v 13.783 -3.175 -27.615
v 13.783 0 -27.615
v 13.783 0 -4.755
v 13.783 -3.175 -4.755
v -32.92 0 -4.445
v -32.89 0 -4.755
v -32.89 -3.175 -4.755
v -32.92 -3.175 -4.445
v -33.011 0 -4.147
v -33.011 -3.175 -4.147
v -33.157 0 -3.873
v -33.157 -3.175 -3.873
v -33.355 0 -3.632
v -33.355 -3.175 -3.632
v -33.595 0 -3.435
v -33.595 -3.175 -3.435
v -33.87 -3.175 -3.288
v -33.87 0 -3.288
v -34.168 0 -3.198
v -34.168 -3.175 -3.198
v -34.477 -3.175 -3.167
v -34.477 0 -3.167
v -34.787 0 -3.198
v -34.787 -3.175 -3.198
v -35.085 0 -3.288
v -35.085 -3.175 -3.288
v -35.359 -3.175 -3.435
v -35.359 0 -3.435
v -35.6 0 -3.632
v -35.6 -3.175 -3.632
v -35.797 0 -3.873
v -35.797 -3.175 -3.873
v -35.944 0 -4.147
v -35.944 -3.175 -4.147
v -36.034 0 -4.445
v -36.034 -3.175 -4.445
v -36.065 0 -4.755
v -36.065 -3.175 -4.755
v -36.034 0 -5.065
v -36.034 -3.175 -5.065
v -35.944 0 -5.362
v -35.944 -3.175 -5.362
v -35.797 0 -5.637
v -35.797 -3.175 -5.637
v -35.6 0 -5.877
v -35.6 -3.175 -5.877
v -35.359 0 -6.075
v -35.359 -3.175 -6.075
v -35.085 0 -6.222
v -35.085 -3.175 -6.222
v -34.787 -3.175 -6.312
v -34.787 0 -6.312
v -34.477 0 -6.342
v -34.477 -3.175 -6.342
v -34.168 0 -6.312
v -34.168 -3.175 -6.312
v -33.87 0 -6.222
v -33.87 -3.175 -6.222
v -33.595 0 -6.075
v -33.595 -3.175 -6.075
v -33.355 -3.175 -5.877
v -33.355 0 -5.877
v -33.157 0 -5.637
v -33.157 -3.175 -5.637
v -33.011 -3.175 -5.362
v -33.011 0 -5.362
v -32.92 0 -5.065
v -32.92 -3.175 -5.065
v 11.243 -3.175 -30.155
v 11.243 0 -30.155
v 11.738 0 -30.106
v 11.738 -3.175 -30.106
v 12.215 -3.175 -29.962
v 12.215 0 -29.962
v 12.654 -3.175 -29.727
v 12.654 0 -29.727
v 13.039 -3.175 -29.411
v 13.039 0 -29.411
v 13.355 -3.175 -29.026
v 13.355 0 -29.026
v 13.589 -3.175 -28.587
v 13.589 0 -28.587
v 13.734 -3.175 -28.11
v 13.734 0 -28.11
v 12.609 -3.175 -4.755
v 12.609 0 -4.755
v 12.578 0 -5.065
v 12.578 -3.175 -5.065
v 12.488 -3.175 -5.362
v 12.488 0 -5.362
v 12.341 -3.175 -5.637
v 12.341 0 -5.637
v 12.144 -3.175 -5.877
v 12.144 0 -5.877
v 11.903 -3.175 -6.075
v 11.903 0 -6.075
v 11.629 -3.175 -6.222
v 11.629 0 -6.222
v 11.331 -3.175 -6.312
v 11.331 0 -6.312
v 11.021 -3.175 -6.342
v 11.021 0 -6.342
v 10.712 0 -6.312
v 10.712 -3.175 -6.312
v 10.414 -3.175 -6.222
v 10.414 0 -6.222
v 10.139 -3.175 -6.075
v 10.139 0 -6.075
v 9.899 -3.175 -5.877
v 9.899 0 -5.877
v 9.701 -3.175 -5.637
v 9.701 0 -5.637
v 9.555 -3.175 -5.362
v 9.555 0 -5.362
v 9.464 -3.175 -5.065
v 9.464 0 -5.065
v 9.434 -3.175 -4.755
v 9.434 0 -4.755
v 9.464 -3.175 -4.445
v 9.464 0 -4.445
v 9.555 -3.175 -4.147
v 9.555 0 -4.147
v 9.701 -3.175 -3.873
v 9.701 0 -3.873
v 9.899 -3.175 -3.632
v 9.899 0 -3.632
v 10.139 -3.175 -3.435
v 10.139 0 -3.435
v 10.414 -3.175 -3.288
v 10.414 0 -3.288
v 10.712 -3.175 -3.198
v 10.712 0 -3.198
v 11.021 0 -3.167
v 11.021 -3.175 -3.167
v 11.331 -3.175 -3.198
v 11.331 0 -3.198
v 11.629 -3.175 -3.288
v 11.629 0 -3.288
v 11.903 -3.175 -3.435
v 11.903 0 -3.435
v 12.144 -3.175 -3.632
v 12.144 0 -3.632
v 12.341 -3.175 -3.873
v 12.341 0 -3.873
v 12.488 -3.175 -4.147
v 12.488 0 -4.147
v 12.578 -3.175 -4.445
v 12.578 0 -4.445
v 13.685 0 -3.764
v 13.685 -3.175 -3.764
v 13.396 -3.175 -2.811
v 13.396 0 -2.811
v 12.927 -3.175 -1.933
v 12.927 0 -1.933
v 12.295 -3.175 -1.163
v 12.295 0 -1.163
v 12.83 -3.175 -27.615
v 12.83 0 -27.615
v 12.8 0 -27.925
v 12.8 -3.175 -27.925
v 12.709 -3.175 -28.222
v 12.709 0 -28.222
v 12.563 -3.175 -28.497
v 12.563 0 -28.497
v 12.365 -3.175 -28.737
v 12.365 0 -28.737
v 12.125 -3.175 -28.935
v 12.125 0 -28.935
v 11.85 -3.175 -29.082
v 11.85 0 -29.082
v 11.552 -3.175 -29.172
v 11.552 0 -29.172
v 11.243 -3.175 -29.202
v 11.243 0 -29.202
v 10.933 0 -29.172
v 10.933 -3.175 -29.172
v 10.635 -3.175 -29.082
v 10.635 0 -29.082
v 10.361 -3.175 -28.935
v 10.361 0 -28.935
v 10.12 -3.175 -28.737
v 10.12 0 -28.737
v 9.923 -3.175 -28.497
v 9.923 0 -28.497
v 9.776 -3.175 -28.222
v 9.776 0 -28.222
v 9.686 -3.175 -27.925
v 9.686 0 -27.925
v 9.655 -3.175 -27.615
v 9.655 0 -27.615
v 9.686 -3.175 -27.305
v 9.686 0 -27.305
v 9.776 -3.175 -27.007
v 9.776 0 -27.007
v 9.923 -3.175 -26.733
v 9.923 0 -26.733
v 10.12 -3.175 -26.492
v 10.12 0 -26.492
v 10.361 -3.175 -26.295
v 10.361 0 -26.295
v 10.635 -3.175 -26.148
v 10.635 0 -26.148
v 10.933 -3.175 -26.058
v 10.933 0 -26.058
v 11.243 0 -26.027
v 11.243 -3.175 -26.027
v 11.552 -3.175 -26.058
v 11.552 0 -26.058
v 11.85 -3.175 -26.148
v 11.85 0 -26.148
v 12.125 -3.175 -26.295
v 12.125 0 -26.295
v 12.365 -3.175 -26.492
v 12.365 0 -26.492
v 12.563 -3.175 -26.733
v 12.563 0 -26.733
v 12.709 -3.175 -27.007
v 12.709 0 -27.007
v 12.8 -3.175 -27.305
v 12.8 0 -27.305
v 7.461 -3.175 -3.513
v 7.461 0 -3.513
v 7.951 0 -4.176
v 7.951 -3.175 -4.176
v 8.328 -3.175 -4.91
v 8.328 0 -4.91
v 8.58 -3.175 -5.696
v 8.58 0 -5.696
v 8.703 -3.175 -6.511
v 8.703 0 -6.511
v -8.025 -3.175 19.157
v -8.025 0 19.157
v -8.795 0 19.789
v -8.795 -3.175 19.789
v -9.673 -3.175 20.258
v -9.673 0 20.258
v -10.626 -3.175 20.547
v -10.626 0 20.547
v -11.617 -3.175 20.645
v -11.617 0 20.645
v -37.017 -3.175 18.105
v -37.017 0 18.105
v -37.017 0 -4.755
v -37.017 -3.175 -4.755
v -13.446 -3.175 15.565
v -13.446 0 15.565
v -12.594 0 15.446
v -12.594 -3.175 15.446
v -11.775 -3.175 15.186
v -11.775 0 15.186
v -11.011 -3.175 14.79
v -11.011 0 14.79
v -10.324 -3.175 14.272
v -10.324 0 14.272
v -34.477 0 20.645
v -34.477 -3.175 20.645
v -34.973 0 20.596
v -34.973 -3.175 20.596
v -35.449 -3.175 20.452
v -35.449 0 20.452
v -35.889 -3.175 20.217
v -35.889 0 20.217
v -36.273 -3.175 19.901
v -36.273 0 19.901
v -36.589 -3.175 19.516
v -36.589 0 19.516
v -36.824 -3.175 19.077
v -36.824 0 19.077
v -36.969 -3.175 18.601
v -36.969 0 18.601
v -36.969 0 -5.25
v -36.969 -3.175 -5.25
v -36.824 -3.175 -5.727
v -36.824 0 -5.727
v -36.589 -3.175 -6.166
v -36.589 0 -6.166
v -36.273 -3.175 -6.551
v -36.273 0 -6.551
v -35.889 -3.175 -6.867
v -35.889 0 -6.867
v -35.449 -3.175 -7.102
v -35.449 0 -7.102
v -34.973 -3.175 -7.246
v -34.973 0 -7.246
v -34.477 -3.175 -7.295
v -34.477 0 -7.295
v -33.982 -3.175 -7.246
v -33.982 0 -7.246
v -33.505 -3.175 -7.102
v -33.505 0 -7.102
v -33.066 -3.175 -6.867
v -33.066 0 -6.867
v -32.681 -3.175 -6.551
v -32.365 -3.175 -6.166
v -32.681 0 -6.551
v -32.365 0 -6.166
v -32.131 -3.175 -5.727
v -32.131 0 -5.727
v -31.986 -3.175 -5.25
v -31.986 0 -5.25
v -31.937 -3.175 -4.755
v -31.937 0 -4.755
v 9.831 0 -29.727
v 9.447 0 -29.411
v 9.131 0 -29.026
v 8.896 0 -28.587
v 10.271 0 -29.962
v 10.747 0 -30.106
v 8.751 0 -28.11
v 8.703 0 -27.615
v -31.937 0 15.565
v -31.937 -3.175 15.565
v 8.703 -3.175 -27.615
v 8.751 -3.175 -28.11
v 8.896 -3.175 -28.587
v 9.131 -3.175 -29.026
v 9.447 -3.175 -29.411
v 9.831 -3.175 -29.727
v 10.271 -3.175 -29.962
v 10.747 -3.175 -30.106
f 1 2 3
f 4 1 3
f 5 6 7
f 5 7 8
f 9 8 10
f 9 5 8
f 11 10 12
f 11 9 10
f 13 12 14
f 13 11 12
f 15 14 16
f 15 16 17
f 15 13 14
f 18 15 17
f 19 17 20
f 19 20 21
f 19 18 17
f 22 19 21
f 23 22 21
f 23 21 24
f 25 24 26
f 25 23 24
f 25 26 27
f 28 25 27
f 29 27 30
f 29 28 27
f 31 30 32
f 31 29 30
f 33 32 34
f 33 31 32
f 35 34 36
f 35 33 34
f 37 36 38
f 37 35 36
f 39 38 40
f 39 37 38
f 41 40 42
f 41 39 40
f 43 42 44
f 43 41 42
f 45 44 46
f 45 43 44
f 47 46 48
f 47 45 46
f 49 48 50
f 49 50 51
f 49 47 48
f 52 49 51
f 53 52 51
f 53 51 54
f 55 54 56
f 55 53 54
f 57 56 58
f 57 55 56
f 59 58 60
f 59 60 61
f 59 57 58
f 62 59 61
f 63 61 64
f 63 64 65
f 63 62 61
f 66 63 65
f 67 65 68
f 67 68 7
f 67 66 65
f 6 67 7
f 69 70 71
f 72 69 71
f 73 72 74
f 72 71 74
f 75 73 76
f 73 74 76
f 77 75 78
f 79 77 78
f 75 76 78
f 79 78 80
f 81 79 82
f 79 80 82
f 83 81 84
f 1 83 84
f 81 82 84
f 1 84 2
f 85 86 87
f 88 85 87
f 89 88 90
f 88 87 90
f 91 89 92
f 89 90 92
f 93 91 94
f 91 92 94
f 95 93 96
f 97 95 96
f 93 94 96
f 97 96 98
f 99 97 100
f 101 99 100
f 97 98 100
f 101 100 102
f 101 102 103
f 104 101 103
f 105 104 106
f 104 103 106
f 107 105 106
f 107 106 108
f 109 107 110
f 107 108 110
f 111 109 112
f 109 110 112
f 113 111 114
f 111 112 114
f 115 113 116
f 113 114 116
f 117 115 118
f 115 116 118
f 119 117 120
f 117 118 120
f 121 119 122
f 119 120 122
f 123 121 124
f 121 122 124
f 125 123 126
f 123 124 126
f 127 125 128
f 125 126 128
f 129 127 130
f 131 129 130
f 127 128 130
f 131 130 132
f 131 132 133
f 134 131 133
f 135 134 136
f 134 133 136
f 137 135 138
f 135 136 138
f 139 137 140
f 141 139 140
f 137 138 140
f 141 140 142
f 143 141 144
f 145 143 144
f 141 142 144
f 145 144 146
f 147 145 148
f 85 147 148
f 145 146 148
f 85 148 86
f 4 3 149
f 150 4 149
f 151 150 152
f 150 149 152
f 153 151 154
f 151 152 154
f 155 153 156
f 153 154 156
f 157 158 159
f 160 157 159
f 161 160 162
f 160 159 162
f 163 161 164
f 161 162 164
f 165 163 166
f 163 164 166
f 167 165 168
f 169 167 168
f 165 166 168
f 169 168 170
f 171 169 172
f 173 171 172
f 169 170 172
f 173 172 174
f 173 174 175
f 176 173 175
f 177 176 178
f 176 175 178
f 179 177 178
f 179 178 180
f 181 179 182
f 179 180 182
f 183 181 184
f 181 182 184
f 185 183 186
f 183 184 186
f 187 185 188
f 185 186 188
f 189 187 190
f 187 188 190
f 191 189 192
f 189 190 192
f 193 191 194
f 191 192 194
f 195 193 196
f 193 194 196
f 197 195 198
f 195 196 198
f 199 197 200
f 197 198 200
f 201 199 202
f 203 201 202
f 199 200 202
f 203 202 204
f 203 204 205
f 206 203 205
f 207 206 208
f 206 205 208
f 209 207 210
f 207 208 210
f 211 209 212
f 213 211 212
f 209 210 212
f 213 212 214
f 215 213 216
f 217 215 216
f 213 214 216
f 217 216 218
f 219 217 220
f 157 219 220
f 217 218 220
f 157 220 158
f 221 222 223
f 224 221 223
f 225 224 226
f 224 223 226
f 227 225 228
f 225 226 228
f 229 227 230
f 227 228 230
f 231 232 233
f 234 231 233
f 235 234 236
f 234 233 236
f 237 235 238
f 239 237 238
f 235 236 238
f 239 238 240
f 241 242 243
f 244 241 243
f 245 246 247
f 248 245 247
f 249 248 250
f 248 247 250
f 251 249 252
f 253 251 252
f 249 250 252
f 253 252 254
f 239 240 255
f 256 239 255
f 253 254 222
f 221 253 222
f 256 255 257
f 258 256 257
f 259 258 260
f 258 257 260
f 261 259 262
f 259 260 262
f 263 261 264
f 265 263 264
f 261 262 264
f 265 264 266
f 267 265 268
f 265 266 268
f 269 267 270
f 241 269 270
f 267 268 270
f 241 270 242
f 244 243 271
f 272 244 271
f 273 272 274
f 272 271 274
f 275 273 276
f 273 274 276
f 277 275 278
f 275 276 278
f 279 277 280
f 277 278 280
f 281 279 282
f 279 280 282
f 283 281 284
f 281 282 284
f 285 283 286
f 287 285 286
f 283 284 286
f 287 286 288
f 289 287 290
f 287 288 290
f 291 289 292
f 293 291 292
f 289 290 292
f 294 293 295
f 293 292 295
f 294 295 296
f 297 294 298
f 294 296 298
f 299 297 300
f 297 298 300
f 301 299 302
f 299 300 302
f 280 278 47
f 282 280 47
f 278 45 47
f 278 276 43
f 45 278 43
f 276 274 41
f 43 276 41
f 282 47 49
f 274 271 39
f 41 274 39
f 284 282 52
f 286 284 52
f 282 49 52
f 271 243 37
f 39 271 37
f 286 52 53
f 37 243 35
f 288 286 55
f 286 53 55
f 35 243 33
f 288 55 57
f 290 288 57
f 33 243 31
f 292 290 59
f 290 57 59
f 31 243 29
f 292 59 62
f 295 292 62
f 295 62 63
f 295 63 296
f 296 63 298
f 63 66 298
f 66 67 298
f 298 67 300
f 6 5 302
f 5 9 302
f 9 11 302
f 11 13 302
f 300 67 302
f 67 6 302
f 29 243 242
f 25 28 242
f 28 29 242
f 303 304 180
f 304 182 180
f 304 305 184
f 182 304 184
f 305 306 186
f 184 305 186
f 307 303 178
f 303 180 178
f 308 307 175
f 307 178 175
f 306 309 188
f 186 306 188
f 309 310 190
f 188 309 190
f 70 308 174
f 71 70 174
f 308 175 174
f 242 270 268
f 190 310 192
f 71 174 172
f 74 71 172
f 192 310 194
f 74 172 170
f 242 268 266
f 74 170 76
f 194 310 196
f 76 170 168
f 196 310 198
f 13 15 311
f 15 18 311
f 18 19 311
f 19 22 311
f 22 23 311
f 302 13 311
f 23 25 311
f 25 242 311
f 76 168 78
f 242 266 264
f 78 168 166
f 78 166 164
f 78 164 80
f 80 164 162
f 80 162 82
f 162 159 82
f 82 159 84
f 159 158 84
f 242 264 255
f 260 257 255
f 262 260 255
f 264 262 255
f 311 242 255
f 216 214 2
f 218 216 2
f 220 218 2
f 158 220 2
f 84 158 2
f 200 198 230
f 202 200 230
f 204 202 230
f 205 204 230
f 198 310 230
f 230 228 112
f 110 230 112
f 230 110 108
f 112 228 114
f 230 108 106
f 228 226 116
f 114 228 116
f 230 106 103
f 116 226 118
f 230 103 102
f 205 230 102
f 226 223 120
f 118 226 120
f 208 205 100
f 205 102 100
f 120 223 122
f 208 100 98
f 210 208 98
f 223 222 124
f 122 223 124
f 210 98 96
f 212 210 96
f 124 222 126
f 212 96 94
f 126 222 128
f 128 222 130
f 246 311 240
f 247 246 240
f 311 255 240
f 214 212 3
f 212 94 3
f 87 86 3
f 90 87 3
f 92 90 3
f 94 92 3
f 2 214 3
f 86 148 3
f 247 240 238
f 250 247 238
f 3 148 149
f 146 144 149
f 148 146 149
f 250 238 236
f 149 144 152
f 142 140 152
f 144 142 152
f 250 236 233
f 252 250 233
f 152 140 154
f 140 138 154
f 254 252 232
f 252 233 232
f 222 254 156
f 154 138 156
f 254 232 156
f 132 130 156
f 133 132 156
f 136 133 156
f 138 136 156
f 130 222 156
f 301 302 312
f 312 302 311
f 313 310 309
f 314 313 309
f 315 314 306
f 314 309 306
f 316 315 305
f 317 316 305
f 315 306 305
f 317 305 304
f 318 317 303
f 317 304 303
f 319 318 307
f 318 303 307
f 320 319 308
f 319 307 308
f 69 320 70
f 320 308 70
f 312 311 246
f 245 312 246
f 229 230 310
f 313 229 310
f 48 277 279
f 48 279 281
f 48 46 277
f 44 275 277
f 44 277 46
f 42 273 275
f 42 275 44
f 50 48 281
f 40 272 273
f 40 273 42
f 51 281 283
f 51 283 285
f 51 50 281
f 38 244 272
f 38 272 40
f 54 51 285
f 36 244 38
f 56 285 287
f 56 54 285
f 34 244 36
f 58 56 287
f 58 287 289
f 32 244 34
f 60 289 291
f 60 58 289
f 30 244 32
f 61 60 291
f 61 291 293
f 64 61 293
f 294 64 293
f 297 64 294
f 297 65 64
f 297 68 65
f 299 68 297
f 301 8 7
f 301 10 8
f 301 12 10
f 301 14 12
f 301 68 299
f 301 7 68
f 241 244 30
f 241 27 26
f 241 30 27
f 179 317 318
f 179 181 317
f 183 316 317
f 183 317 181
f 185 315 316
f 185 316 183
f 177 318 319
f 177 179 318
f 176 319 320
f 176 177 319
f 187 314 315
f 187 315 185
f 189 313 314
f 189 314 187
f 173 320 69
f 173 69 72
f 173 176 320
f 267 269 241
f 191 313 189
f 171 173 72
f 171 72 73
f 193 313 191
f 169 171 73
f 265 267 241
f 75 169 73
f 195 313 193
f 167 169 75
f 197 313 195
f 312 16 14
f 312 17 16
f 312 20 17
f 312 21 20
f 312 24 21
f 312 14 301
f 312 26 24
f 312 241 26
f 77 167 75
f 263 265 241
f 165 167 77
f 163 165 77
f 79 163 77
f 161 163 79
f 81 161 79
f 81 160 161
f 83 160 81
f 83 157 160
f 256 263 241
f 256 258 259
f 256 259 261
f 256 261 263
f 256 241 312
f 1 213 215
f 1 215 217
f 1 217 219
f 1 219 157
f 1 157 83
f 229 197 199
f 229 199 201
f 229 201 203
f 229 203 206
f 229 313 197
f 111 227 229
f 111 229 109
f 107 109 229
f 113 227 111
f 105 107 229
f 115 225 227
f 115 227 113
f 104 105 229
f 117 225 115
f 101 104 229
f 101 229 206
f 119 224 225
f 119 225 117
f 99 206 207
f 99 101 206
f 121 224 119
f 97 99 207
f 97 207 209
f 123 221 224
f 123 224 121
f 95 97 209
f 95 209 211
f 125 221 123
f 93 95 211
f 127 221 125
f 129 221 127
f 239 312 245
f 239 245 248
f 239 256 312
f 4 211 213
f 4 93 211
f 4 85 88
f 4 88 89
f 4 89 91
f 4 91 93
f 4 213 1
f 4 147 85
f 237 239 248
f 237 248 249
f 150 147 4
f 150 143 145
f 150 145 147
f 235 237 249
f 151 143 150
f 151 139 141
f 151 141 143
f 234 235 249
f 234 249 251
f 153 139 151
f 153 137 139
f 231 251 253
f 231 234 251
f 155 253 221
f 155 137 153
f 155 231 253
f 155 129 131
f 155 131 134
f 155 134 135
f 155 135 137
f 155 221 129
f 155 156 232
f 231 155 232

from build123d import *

# Parameters (mm, degrees)
F0_R     = 1.5875
F1_DEPTH = 3.175


# Not quite as in the source:
# - ends of sketch curves that miss each other by under 0.0002 mm in the source are joined
# - a feature names something its author has since deleted; it is built from what else it names


with BuildPart() as f1:
    # F0 (on Front) → F1 (new body)
    with BuildSketch(Plane.XZ):
        with BuildLine():
            Line((8.7026358494, -4.754912237), (7.4606623464, -3.512938734))
            ThreePointArc((7.4606623464, -3.512938734), (8.3275358886, -4.9102837361), (8.7026358494, -6.5113280243))
            Line((8.7026358494, -6.5113280243), (8.7026358494, -4.754912237))
        make_face()
        with BuildLine():
            Line((-10.3241423466, 14.271865959), (-11.6173641506, 15.565087763))
            Line((-11.6173641506, 15.565087763), (-13.4462559649, 15.565087763))
            ThreePointArc((-13.4462559649, 15.565087763), (-11.774512383, 15.185698369), (-10.3241423466, 14.271865959))
        make_face()
        with BuildLine():
            ThreePointArc((-8.0252617022, 19.1571902114), (-9.6733323142, 20.2583957881), (-11.6173641506, 20.645087763))
            Line((-11.6173641506, 20.645087763), (-11.6173641506, 15.565087763))
            Line((-11.6173641506, 15.565087763), (-8.0252617022, 19.1571902114))
        make_face()
        with BuildLine():
            ThreePointArc((13.7826358494, -4.7549120495), (13.3959438387, -2.810880314), (12.2947382978, -1.1628097886))
            Line((12.2947382978, -1.1628097886), (8.7026358494, -4.754912237))
            Line((8.7026358494, -4.754912237), (9.4338794152, -4.75491221))
            ThreePointArc((9.4338794152, -4.75491221), (11.0213794287, -3.167412237), (12.6088794152, -4.754912237))
            Line((12.6088794152, -4.754912237), (13.7826358494, -4.7549120495))
        make_face()
        with BuildLine():
            ThreePointArc((-34.4773641506, 20.645087763), (-36.2734153748, 19.9011389872), (-37.0173641506, 18.105087763))
            Line((-37.0173641506, 18.105087763), (-37.0173641506, -4.754912237))
            ThreePointArc((-37.0173641506, -4.754912237), (-34.4773641506, -7.294912237), (-31.9373641506, -4.754912237))
            Line((-31.9373641506, -4.754912237), (-31.9373641506, 13.025087763))
            Line((-31.9373641506, 13.025087763), (-31.9373641506, 15.565087763))
            Line((-31.9373641506, 15.565087763), (-31.9373641506, 20.645087763))
            Line((-31.9373641506, 20.645087763), (-34.4773641506, 20.645087763))
        make_face()
        with Locations((-34.4773641506, -4.754912237)):
            Circle(F0_R, mode=Mode.SUBTRACT)
        Polygon((-11.6173641506, 20.645087763), (-31.9373641506, 20.645087763), (-31.9373641506, 15.565087763), (-29.3973641506, 15.565087763), (-13.4462559649, 15.565087763), (-11.6173641506, 15.565087763), align=None)
        with BuildLine():
            ThreePointArc((11.2426358494, -30.154912237), (13.0386870736, -29.4109634612), (13.7826358494, -27.614912237))
            Line((13.7826358494, -27.614912237), (12.8301358494, -27.614912237))
            ThreePointArc((12.8301358494, -27.614912237), (11.2426358494, -29.202412237), (9.6551358494, -27.614912237))
            Line((9.6551358494, -27.614912237), (8.7026358494, -27.614912237))
            ThreePointArc((8.7026358494, -27.614912237), (9.4465846252, -29.4109634612), (11.2426358494, -30.154912237))
        make_face()
        with BuildLine():
            Line((9.4338794152, -4.75491221), (8.7026358494, -4.754912237))
            Line((8.7026358494, -4.754912237), (8.7026358494, -6.5113280243))
            Line((8.7026358494, -6.5113280243), (8.7026358494, -27.614912237))
            Line((8.7026358494, -27.614912237), (9.6551358494, -27.614912237))
            ThreePointArc((9.6551358494, -27.614912237), (11.2426358494, -26.027412237), (12.8301358494, -27.614912237))
            Line((12.8301358494, -27.614912237), (13.7826358494, -27.614912237))
            Line((13.7826358494, -27.614912237), (13.7826358494, -4.7549120495))
            Line((13.7826358494, -4.7549120495), (12.6088794152, -4.7549120928))
            ThreePointArc((12.6088794152, -4.7549120928), (11.0213794017, -6.342412237), (9.4338794152, -4.75491221))
        make_face()
        Polygon((-8.0252617022, 19.1571902114), (-11.6173641506, 15.565087763), (-10.3241423466, 14.271865959), (7.4606623464, -3.512938734), (8.7026358494, -4.754912237), (12.2947382978, -1.1628097886), align=None)
    extrude(amount=F1_DEPTH)


solid = f1.part
